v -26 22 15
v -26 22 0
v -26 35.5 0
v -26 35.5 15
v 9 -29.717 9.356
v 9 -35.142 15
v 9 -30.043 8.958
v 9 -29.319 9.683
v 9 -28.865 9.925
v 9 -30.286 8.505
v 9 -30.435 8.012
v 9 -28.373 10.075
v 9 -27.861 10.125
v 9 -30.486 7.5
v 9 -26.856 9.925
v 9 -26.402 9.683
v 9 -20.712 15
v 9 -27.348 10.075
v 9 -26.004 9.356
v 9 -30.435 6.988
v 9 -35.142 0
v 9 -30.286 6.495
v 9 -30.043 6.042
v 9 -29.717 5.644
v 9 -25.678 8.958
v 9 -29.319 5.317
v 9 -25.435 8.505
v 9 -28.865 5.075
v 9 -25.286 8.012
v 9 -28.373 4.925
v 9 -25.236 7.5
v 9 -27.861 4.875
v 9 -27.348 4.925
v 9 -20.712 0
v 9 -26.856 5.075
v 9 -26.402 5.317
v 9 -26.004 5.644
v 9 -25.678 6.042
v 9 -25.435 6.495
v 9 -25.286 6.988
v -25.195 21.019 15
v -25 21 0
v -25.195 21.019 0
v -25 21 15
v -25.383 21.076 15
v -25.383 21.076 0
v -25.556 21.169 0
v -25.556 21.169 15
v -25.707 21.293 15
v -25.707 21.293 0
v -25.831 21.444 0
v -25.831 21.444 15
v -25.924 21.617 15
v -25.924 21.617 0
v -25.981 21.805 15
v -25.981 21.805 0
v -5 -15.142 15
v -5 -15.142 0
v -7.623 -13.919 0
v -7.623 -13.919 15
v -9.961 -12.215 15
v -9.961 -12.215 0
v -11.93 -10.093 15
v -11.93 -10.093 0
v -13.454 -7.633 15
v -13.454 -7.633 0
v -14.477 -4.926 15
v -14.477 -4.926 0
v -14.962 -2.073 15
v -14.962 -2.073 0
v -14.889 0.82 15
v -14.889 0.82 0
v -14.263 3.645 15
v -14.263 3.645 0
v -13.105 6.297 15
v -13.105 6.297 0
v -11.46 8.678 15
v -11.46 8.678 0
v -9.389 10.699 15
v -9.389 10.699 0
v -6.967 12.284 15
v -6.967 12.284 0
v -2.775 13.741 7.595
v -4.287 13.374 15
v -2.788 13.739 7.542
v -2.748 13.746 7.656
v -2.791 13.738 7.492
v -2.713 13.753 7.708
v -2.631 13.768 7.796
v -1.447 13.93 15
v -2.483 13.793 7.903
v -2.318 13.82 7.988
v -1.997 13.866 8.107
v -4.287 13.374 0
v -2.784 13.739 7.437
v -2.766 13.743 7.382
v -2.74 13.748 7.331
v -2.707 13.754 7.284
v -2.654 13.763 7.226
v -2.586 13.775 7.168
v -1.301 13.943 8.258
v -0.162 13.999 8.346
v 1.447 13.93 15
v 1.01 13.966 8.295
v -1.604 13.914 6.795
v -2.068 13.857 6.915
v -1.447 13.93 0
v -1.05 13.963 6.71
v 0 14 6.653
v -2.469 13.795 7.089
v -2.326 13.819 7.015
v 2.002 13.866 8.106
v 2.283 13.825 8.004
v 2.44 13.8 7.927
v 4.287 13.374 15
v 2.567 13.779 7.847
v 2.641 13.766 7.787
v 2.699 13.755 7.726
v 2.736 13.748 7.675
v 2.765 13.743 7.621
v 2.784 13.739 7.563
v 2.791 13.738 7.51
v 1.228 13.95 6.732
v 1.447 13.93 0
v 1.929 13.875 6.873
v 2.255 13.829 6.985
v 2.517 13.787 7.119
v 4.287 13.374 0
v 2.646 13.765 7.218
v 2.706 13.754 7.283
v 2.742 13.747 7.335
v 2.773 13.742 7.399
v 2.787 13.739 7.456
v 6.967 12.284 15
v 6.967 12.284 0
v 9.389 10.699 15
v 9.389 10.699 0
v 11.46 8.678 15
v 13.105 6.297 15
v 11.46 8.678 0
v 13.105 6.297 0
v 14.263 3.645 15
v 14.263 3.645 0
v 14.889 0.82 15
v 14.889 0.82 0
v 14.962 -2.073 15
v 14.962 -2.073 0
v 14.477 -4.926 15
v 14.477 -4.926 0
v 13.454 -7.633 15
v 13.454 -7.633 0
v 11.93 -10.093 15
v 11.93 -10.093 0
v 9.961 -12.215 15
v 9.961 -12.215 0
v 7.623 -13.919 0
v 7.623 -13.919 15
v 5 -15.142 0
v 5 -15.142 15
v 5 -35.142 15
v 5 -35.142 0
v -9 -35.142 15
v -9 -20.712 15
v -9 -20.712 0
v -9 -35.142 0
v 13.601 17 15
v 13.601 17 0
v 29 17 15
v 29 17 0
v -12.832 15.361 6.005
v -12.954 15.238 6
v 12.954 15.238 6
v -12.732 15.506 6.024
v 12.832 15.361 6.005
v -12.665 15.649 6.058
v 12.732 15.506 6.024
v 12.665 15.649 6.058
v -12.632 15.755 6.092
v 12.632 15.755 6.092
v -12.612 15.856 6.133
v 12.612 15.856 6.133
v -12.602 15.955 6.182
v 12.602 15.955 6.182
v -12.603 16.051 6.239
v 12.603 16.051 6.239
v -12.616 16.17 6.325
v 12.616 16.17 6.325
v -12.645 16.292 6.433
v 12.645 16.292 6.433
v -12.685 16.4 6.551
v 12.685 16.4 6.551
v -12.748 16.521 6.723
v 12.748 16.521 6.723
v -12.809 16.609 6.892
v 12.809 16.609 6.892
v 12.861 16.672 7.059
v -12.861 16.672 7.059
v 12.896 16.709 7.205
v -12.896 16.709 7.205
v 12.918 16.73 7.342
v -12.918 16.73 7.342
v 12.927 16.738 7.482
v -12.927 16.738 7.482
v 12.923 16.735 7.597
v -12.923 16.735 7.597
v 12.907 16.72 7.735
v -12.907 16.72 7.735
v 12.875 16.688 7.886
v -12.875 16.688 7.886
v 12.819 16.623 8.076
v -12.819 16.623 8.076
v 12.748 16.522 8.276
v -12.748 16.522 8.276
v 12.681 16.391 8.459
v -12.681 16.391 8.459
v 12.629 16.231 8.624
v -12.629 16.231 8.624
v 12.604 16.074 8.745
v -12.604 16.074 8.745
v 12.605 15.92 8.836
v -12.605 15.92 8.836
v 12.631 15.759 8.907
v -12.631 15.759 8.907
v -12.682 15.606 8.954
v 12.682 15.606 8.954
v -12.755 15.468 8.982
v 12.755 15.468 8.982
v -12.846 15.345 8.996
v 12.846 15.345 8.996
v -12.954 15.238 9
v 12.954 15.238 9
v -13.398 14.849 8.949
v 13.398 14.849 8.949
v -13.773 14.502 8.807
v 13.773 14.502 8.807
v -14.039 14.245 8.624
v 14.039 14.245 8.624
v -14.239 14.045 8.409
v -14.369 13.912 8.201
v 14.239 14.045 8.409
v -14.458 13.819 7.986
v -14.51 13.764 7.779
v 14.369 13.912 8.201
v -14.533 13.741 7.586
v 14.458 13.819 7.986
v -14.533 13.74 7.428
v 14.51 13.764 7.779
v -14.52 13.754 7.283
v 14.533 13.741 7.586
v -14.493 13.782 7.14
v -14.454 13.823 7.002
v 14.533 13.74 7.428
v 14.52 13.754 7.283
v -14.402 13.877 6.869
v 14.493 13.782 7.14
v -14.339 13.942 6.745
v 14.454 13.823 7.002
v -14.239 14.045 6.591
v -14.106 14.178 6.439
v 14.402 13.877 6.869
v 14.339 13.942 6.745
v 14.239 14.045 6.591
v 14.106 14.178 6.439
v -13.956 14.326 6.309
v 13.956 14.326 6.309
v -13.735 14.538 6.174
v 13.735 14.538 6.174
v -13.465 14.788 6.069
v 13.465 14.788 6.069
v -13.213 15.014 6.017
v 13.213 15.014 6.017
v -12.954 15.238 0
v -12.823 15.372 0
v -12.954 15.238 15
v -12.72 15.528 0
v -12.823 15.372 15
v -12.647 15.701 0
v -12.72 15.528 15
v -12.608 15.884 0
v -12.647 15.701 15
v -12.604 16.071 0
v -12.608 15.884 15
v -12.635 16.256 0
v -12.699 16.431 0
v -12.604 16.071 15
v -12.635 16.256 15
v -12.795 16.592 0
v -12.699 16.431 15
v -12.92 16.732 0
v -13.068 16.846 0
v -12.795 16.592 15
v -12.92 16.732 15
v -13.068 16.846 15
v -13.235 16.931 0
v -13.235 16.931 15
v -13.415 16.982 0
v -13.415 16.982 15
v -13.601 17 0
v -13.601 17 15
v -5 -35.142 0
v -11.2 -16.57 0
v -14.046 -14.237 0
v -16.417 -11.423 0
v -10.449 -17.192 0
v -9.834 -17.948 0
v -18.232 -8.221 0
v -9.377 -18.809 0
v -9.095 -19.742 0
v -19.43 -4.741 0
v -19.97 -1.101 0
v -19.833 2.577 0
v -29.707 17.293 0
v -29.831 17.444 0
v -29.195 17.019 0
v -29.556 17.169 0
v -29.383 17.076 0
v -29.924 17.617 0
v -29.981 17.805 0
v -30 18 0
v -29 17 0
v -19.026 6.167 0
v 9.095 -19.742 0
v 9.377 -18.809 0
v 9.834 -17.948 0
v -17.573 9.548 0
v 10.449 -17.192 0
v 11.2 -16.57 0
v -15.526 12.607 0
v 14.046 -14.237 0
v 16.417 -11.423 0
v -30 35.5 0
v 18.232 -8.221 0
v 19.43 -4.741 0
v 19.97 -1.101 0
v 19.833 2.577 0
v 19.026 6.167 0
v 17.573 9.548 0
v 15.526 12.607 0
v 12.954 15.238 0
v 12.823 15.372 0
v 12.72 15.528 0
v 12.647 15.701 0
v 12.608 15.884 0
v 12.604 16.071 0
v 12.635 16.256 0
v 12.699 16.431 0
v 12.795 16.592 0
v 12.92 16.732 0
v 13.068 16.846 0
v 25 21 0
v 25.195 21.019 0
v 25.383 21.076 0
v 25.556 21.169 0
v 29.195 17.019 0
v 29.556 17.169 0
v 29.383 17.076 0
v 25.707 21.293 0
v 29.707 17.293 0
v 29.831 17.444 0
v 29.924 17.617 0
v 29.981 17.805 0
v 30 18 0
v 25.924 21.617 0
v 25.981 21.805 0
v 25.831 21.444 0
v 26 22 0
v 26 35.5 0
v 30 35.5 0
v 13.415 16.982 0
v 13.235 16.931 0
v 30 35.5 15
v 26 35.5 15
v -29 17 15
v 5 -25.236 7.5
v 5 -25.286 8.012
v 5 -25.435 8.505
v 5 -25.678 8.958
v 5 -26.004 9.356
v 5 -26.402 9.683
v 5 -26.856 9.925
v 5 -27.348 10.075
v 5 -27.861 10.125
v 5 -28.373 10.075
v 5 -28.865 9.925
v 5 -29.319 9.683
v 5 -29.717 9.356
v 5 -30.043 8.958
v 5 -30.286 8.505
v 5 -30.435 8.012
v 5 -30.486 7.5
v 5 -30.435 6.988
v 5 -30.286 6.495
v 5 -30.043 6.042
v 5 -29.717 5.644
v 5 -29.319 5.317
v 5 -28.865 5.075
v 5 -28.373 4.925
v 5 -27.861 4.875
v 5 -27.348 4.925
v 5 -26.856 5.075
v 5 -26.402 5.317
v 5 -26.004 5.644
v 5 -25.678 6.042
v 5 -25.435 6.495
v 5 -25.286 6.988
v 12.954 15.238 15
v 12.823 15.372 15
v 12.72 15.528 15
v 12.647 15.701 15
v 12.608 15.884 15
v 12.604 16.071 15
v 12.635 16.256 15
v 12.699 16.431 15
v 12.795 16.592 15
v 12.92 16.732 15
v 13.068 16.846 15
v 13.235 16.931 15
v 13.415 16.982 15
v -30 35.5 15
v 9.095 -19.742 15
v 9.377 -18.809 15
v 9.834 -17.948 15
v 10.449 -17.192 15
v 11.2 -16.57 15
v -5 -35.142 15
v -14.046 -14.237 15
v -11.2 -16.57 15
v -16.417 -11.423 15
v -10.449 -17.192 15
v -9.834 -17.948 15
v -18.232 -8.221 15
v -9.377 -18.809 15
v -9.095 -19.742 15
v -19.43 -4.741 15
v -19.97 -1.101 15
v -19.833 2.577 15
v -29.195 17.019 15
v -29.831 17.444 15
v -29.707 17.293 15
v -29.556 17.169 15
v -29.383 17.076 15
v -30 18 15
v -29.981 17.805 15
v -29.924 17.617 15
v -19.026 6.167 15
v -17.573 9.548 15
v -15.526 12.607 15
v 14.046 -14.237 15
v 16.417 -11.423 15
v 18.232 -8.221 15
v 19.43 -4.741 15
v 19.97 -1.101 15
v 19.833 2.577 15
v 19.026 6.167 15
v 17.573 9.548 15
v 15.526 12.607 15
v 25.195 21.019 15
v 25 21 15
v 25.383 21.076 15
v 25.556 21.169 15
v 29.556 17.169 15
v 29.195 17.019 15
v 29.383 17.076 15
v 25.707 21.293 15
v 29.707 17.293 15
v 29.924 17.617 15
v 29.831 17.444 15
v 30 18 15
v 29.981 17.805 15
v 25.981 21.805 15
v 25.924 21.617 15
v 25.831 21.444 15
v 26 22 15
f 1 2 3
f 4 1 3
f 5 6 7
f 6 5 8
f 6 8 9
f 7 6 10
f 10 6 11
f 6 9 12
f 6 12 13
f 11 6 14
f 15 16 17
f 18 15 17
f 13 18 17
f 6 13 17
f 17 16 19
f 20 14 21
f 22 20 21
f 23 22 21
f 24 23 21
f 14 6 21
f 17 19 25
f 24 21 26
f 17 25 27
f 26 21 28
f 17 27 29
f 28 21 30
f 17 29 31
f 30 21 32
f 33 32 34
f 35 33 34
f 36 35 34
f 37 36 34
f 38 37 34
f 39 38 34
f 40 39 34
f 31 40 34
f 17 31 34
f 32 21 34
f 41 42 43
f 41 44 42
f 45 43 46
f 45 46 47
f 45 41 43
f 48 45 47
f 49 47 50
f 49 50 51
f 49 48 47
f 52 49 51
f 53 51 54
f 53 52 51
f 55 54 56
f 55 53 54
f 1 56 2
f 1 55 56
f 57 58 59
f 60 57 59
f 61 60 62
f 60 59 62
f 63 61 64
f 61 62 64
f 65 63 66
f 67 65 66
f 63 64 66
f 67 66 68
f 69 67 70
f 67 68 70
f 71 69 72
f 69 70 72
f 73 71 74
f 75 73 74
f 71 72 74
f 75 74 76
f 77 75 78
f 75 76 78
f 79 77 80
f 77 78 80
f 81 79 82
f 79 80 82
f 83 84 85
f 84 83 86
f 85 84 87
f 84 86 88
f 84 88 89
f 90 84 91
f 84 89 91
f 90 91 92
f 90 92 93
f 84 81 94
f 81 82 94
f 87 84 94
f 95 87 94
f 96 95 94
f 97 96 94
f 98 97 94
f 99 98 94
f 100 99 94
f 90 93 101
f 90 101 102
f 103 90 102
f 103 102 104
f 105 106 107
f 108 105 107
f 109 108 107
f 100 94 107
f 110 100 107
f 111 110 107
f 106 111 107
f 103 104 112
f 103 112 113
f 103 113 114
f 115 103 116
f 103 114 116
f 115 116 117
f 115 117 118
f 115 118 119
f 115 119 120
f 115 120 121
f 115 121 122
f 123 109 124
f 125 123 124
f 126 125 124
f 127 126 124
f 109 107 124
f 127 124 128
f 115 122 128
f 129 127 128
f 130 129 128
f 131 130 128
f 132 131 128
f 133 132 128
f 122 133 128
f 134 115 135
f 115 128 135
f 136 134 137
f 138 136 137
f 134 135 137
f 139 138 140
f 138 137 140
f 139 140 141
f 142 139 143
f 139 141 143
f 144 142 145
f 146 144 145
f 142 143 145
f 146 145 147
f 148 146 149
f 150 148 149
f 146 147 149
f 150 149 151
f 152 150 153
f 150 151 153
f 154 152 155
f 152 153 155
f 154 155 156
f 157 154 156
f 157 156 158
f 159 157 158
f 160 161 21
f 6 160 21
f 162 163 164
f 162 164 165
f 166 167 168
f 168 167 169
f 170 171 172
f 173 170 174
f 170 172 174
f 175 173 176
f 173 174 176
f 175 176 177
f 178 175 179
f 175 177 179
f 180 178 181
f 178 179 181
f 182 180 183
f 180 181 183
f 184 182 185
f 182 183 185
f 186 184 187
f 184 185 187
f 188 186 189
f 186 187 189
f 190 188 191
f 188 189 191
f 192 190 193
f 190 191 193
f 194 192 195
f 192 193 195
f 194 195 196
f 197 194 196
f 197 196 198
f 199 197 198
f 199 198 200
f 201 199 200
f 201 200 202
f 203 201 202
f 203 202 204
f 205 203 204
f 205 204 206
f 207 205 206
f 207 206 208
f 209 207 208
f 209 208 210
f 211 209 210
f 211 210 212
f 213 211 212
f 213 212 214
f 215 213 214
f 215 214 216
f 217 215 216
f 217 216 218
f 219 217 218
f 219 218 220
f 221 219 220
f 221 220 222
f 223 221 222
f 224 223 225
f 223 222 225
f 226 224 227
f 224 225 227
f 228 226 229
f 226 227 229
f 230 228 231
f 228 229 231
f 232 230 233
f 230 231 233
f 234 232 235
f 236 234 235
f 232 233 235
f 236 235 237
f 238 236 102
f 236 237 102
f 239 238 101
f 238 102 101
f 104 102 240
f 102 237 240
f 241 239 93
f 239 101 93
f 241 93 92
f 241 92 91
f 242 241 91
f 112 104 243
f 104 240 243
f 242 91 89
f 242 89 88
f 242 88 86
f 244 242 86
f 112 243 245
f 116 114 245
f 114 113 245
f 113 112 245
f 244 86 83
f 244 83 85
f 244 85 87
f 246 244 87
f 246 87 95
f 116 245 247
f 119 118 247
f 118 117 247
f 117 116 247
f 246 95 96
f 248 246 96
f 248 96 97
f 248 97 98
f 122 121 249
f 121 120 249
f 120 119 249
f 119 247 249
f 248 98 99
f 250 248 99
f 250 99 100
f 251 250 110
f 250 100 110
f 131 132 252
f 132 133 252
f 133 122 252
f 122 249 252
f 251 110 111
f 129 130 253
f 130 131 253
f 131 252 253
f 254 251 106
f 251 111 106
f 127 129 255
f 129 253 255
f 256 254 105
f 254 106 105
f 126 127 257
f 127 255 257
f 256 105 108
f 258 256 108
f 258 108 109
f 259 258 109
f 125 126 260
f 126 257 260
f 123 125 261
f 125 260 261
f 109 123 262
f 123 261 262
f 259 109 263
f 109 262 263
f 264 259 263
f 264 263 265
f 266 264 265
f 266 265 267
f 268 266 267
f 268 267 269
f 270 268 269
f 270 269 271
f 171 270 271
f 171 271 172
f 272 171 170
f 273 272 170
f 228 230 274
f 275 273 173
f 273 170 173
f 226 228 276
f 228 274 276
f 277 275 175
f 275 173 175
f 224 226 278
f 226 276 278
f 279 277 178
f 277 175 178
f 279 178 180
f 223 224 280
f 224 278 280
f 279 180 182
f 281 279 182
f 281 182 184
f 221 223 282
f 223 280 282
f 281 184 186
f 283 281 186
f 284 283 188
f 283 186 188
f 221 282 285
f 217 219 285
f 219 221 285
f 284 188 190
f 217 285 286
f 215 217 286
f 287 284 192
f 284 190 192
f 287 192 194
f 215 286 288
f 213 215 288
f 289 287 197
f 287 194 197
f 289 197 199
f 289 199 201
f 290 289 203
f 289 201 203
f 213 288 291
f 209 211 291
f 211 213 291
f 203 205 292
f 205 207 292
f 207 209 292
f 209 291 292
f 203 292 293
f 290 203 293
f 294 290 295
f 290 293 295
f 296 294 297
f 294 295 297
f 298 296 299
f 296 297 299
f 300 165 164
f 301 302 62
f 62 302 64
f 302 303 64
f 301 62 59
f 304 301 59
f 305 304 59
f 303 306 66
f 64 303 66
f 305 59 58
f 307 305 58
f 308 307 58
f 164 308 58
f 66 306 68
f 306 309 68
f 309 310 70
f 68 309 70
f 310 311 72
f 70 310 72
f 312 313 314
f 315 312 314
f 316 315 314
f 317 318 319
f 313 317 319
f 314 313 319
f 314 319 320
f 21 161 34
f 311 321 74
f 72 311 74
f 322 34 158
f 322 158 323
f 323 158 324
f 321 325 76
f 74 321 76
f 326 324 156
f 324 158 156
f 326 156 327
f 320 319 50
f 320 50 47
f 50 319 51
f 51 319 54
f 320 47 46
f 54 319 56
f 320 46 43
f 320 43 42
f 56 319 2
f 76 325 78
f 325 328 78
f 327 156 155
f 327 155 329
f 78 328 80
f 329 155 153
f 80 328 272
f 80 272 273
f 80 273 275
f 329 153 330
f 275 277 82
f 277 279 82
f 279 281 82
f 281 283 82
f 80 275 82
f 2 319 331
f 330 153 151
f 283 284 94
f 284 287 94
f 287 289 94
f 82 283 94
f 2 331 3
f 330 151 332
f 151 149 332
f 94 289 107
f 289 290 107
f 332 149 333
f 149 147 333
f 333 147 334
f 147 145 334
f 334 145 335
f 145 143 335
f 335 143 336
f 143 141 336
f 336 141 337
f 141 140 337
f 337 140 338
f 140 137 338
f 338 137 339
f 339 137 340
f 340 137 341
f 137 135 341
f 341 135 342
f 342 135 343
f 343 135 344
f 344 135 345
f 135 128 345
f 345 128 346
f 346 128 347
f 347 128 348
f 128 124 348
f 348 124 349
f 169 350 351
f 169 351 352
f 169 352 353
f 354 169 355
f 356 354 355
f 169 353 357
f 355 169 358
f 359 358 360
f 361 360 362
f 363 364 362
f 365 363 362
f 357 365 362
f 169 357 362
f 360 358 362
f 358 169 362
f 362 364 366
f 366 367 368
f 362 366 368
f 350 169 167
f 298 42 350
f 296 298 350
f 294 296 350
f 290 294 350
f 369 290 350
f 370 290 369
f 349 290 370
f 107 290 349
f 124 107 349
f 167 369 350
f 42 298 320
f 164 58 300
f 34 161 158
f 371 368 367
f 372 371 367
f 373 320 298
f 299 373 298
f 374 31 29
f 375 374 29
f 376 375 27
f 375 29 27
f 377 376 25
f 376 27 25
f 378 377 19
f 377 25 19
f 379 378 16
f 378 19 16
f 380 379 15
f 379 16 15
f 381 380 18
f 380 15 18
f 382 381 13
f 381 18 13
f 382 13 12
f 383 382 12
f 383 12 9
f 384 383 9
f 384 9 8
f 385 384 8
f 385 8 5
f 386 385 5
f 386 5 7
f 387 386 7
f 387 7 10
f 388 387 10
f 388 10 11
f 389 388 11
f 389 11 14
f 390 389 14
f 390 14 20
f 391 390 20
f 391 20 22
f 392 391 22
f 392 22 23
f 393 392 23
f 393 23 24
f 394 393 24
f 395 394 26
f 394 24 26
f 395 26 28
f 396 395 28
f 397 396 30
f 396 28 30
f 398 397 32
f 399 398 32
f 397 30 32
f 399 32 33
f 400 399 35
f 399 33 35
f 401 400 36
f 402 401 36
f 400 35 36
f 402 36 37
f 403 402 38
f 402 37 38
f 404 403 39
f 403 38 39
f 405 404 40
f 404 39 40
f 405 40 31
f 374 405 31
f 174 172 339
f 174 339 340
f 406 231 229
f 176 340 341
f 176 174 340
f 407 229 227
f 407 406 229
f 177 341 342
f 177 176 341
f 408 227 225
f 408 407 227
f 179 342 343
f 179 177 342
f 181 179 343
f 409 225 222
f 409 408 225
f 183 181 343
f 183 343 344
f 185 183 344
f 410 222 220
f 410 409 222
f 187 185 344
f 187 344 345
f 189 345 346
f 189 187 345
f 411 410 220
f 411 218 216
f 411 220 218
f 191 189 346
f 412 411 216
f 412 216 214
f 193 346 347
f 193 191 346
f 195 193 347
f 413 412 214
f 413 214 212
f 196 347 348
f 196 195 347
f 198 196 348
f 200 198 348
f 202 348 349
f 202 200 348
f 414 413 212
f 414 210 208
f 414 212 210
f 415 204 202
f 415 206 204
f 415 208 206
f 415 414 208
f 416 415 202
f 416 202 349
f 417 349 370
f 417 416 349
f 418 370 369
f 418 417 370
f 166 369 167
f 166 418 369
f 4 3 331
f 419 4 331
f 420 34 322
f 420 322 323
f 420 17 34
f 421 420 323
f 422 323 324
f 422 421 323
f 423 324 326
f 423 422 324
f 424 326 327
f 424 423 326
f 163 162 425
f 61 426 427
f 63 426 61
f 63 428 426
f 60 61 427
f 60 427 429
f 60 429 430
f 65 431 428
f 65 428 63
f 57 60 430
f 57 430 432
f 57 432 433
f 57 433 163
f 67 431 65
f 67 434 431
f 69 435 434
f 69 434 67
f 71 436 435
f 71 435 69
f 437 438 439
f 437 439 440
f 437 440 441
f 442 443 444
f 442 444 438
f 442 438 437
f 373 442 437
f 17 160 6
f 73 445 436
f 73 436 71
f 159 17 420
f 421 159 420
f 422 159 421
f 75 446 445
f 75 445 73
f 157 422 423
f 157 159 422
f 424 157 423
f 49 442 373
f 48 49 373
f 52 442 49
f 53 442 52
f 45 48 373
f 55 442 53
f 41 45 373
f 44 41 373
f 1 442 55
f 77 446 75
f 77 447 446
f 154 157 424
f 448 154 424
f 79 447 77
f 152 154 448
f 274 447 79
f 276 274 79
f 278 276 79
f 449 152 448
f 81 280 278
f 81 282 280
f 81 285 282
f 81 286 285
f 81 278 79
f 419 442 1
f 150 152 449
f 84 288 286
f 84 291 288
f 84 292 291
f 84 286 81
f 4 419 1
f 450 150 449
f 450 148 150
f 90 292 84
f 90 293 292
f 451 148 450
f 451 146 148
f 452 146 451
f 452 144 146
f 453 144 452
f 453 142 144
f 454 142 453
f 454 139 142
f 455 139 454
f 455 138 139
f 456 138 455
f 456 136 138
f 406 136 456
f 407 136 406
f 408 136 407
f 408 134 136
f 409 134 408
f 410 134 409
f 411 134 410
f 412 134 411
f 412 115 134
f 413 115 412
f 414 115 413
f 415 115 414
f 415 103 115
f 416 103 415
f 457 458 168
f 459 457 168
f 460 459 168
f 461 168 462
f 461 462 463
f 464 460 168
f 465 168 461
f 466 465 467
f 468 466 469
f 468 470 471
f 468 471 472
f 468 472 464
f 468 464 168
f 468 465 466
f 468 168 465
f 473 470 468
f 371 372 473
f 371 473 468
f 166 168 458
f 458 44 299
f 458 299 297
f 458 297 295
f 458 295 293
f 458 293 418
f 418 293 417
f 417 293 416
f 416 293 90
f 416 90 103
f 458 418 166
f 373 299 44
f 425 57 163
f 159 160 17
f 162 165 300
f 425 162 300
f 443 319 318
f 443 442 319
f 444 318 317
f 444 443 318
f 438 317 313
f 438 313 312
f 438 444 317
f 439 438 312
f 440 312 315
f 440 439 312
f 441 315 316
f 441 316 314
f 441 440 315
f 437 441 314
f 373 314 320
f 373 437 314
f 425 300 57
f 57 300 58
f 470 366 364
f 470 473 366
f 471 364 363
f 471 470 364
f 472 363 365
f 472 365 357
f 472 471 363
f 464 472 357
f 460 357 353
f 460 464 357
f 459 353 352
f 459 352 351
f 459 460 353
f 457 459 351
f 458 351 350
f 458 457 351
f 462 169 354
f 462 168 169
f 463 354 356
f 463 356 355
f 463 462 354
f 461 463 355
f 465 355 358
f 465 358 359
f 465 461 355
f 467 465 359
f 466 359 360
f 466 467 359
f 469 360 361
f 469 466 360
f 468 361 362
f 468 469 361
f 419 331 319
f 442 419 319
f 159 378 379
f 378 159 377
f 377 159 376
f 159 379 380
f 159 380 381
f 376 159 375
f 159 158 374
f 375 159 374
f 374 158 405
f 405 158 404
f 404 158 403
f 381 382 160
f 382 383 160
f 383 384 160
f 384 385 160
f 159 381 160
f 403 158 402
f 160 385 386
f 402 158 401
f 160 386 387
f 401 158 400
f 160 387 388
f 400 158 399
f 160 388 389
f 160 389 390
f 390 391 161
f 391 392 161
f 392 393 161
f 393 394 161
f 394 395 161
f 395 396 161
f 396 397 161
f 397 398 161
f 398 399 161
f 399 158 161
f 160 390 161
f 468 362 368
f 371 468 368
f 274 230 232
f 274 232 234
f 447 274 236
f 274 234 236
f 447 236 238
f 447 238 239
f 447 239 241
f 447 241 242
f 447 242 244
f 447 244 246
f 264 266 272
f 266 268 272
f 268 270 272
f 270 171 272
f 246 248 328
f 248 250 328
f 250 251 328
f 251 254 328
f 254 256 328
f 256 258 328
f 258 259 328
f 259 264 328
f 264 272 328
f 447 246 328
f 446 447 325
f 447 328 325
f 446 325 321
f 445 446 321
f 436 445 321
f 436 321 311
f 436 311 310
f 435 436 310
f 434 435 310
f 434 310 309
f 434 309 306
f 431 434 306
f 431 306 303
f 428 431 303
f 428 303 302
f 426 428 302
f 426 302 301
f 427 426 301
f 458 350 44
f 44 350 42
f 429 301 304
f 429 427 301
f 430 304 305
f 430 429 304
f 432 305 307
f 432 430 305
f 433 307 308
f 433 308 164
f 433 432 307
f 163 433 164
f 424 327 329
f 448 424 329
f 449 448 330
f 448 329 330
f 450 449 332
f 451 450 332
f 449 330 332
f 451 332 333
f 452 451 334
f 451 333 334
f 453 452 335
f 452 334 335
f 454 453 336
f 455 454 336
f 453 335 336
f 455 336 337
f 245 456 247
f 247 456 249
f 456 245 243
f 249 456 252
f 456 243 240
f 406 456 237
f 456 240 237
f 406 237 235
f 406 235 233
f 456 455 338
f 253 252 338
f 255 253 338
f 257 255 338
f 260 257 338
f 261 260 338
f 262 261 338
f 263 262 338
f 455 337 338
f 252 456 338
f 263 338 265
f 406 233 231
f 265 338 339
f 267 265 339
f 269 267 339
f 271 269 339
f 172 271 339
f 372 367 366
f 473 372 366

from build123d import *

# Parameters (mm, degrees)
BOSS_EXTRUDE1_DEPTH = 15
SKETCH2_R           = 2.625
CUT_EXTRUDE1_DEPTH  = 10
FILLET3_R           = 5
FILLET5_R           = 1
FILLET6_R           = 1
SKETCH3_R           = 1.5
CUT_EXTRUDE4_DEPTH  = 58


with BuildPart() as part:
    # Sketch1 → Boss-Extrude1 (new body)
    with BuildSketch(Plane.XY):
        with BuildLine():
            ThreePointArc((-5, -15.142135624), (0, 14), (5, -15.142135624))
            Line((5, -15.142135624), (5, -35.142135624))
            Line((5, -35.142135624), (9, -35.142135624))
            Line((9, -35.142135624), (9, -17.860571099))
            ThreePointArc((9, -17.860571099), (19.980623019, -0.880172578), (10.535653753, 17))
            Line((10.535653753, 17), (30, 17))
            Line((30, 17), (30, 35.5))
            Line((30, 35.5), (26, 35.5))
            Line((26, 35.5), (26, 21))
            Line((26, 21), (-26, 21))
            Line((-26, 21), (-26, 35.5))
            Line((-26, 35.5), (-30, 35.5))
            Line((-30, 35.5), (-30, 17))
            Line((-30, 17), (-10.535653753, 17))
            ThreePointArc((-10.535653753, 17), (-19.980623019, -0.880172578), (-9, -17.860571099))
            Line((-9, -17.860571099), (-9, -35.142135624))
            Line((-9, -35.142135624), (-5, -35.142135624))
            Line((-5, -35.142135624), (-5, -15.142135624))
        make_face()
    extrude(amount=BOSS_EXTRUDE1_DEPTH)

    # Sketch2 → Cut-Extrude1 (cut)
    with BuildSketch(Plane(origin=(9, 0, 0), x_dir=(0, 0, -1), z_dir=(1, 0, 0))):
        with Locations(Location((-7.5, -27.860571099, 0), (0, 0, 90))):
            Circle(SKETCH2_R)
    extrude(amount=-CUT_EXTRUDE1_DEPTH, mode=Mode.SUBTRACT)

    # Fillet3
    fillet3_edges = [part.edges().sort_by_distance(p)[0] for p in [
        (9, -17.860571099, 7.5),
        (-9, -17.860571099, 7.5),
    ]]
    fillet(fillet3_edges, radius=FILLET3_R)

    # Fillet5
    fillet5_edges = [part.edges().sort_by_distance(p)[0] for p in [
        (10.535653753, 17, 7.5),
        (-10.535653753, 17, 7.5),
    ]]
    fillet(fillet5_edges, radius=FILLET5_R)

    # Fillet6
    fillet6_edges = [part.edges().sort_by_distance(p)[0] for p in [
        (26, 21, 7.5),
        (-26, 21, 7.5),
        (-30, 17, 7.5),
        (30, 17, 7.5),
    ]]
    fillet(fillet6_edges, radius=FILLET6_R)

    # Sketch3 → Cut-Extrude4 (cut)
    with BuildSketch(Plane(origin=(30, 0, 0), x_dir=(0, 0, -1), z_dir=(1, 0, 0))):
        with Locations((-7.5, 15.238095238)):
            Circle(SKETCH3_R)
    extrude(amount=-CUT_EXTRUDE4_DEPTH, mode=Mode.SUBTRACT)


solid = part.part
